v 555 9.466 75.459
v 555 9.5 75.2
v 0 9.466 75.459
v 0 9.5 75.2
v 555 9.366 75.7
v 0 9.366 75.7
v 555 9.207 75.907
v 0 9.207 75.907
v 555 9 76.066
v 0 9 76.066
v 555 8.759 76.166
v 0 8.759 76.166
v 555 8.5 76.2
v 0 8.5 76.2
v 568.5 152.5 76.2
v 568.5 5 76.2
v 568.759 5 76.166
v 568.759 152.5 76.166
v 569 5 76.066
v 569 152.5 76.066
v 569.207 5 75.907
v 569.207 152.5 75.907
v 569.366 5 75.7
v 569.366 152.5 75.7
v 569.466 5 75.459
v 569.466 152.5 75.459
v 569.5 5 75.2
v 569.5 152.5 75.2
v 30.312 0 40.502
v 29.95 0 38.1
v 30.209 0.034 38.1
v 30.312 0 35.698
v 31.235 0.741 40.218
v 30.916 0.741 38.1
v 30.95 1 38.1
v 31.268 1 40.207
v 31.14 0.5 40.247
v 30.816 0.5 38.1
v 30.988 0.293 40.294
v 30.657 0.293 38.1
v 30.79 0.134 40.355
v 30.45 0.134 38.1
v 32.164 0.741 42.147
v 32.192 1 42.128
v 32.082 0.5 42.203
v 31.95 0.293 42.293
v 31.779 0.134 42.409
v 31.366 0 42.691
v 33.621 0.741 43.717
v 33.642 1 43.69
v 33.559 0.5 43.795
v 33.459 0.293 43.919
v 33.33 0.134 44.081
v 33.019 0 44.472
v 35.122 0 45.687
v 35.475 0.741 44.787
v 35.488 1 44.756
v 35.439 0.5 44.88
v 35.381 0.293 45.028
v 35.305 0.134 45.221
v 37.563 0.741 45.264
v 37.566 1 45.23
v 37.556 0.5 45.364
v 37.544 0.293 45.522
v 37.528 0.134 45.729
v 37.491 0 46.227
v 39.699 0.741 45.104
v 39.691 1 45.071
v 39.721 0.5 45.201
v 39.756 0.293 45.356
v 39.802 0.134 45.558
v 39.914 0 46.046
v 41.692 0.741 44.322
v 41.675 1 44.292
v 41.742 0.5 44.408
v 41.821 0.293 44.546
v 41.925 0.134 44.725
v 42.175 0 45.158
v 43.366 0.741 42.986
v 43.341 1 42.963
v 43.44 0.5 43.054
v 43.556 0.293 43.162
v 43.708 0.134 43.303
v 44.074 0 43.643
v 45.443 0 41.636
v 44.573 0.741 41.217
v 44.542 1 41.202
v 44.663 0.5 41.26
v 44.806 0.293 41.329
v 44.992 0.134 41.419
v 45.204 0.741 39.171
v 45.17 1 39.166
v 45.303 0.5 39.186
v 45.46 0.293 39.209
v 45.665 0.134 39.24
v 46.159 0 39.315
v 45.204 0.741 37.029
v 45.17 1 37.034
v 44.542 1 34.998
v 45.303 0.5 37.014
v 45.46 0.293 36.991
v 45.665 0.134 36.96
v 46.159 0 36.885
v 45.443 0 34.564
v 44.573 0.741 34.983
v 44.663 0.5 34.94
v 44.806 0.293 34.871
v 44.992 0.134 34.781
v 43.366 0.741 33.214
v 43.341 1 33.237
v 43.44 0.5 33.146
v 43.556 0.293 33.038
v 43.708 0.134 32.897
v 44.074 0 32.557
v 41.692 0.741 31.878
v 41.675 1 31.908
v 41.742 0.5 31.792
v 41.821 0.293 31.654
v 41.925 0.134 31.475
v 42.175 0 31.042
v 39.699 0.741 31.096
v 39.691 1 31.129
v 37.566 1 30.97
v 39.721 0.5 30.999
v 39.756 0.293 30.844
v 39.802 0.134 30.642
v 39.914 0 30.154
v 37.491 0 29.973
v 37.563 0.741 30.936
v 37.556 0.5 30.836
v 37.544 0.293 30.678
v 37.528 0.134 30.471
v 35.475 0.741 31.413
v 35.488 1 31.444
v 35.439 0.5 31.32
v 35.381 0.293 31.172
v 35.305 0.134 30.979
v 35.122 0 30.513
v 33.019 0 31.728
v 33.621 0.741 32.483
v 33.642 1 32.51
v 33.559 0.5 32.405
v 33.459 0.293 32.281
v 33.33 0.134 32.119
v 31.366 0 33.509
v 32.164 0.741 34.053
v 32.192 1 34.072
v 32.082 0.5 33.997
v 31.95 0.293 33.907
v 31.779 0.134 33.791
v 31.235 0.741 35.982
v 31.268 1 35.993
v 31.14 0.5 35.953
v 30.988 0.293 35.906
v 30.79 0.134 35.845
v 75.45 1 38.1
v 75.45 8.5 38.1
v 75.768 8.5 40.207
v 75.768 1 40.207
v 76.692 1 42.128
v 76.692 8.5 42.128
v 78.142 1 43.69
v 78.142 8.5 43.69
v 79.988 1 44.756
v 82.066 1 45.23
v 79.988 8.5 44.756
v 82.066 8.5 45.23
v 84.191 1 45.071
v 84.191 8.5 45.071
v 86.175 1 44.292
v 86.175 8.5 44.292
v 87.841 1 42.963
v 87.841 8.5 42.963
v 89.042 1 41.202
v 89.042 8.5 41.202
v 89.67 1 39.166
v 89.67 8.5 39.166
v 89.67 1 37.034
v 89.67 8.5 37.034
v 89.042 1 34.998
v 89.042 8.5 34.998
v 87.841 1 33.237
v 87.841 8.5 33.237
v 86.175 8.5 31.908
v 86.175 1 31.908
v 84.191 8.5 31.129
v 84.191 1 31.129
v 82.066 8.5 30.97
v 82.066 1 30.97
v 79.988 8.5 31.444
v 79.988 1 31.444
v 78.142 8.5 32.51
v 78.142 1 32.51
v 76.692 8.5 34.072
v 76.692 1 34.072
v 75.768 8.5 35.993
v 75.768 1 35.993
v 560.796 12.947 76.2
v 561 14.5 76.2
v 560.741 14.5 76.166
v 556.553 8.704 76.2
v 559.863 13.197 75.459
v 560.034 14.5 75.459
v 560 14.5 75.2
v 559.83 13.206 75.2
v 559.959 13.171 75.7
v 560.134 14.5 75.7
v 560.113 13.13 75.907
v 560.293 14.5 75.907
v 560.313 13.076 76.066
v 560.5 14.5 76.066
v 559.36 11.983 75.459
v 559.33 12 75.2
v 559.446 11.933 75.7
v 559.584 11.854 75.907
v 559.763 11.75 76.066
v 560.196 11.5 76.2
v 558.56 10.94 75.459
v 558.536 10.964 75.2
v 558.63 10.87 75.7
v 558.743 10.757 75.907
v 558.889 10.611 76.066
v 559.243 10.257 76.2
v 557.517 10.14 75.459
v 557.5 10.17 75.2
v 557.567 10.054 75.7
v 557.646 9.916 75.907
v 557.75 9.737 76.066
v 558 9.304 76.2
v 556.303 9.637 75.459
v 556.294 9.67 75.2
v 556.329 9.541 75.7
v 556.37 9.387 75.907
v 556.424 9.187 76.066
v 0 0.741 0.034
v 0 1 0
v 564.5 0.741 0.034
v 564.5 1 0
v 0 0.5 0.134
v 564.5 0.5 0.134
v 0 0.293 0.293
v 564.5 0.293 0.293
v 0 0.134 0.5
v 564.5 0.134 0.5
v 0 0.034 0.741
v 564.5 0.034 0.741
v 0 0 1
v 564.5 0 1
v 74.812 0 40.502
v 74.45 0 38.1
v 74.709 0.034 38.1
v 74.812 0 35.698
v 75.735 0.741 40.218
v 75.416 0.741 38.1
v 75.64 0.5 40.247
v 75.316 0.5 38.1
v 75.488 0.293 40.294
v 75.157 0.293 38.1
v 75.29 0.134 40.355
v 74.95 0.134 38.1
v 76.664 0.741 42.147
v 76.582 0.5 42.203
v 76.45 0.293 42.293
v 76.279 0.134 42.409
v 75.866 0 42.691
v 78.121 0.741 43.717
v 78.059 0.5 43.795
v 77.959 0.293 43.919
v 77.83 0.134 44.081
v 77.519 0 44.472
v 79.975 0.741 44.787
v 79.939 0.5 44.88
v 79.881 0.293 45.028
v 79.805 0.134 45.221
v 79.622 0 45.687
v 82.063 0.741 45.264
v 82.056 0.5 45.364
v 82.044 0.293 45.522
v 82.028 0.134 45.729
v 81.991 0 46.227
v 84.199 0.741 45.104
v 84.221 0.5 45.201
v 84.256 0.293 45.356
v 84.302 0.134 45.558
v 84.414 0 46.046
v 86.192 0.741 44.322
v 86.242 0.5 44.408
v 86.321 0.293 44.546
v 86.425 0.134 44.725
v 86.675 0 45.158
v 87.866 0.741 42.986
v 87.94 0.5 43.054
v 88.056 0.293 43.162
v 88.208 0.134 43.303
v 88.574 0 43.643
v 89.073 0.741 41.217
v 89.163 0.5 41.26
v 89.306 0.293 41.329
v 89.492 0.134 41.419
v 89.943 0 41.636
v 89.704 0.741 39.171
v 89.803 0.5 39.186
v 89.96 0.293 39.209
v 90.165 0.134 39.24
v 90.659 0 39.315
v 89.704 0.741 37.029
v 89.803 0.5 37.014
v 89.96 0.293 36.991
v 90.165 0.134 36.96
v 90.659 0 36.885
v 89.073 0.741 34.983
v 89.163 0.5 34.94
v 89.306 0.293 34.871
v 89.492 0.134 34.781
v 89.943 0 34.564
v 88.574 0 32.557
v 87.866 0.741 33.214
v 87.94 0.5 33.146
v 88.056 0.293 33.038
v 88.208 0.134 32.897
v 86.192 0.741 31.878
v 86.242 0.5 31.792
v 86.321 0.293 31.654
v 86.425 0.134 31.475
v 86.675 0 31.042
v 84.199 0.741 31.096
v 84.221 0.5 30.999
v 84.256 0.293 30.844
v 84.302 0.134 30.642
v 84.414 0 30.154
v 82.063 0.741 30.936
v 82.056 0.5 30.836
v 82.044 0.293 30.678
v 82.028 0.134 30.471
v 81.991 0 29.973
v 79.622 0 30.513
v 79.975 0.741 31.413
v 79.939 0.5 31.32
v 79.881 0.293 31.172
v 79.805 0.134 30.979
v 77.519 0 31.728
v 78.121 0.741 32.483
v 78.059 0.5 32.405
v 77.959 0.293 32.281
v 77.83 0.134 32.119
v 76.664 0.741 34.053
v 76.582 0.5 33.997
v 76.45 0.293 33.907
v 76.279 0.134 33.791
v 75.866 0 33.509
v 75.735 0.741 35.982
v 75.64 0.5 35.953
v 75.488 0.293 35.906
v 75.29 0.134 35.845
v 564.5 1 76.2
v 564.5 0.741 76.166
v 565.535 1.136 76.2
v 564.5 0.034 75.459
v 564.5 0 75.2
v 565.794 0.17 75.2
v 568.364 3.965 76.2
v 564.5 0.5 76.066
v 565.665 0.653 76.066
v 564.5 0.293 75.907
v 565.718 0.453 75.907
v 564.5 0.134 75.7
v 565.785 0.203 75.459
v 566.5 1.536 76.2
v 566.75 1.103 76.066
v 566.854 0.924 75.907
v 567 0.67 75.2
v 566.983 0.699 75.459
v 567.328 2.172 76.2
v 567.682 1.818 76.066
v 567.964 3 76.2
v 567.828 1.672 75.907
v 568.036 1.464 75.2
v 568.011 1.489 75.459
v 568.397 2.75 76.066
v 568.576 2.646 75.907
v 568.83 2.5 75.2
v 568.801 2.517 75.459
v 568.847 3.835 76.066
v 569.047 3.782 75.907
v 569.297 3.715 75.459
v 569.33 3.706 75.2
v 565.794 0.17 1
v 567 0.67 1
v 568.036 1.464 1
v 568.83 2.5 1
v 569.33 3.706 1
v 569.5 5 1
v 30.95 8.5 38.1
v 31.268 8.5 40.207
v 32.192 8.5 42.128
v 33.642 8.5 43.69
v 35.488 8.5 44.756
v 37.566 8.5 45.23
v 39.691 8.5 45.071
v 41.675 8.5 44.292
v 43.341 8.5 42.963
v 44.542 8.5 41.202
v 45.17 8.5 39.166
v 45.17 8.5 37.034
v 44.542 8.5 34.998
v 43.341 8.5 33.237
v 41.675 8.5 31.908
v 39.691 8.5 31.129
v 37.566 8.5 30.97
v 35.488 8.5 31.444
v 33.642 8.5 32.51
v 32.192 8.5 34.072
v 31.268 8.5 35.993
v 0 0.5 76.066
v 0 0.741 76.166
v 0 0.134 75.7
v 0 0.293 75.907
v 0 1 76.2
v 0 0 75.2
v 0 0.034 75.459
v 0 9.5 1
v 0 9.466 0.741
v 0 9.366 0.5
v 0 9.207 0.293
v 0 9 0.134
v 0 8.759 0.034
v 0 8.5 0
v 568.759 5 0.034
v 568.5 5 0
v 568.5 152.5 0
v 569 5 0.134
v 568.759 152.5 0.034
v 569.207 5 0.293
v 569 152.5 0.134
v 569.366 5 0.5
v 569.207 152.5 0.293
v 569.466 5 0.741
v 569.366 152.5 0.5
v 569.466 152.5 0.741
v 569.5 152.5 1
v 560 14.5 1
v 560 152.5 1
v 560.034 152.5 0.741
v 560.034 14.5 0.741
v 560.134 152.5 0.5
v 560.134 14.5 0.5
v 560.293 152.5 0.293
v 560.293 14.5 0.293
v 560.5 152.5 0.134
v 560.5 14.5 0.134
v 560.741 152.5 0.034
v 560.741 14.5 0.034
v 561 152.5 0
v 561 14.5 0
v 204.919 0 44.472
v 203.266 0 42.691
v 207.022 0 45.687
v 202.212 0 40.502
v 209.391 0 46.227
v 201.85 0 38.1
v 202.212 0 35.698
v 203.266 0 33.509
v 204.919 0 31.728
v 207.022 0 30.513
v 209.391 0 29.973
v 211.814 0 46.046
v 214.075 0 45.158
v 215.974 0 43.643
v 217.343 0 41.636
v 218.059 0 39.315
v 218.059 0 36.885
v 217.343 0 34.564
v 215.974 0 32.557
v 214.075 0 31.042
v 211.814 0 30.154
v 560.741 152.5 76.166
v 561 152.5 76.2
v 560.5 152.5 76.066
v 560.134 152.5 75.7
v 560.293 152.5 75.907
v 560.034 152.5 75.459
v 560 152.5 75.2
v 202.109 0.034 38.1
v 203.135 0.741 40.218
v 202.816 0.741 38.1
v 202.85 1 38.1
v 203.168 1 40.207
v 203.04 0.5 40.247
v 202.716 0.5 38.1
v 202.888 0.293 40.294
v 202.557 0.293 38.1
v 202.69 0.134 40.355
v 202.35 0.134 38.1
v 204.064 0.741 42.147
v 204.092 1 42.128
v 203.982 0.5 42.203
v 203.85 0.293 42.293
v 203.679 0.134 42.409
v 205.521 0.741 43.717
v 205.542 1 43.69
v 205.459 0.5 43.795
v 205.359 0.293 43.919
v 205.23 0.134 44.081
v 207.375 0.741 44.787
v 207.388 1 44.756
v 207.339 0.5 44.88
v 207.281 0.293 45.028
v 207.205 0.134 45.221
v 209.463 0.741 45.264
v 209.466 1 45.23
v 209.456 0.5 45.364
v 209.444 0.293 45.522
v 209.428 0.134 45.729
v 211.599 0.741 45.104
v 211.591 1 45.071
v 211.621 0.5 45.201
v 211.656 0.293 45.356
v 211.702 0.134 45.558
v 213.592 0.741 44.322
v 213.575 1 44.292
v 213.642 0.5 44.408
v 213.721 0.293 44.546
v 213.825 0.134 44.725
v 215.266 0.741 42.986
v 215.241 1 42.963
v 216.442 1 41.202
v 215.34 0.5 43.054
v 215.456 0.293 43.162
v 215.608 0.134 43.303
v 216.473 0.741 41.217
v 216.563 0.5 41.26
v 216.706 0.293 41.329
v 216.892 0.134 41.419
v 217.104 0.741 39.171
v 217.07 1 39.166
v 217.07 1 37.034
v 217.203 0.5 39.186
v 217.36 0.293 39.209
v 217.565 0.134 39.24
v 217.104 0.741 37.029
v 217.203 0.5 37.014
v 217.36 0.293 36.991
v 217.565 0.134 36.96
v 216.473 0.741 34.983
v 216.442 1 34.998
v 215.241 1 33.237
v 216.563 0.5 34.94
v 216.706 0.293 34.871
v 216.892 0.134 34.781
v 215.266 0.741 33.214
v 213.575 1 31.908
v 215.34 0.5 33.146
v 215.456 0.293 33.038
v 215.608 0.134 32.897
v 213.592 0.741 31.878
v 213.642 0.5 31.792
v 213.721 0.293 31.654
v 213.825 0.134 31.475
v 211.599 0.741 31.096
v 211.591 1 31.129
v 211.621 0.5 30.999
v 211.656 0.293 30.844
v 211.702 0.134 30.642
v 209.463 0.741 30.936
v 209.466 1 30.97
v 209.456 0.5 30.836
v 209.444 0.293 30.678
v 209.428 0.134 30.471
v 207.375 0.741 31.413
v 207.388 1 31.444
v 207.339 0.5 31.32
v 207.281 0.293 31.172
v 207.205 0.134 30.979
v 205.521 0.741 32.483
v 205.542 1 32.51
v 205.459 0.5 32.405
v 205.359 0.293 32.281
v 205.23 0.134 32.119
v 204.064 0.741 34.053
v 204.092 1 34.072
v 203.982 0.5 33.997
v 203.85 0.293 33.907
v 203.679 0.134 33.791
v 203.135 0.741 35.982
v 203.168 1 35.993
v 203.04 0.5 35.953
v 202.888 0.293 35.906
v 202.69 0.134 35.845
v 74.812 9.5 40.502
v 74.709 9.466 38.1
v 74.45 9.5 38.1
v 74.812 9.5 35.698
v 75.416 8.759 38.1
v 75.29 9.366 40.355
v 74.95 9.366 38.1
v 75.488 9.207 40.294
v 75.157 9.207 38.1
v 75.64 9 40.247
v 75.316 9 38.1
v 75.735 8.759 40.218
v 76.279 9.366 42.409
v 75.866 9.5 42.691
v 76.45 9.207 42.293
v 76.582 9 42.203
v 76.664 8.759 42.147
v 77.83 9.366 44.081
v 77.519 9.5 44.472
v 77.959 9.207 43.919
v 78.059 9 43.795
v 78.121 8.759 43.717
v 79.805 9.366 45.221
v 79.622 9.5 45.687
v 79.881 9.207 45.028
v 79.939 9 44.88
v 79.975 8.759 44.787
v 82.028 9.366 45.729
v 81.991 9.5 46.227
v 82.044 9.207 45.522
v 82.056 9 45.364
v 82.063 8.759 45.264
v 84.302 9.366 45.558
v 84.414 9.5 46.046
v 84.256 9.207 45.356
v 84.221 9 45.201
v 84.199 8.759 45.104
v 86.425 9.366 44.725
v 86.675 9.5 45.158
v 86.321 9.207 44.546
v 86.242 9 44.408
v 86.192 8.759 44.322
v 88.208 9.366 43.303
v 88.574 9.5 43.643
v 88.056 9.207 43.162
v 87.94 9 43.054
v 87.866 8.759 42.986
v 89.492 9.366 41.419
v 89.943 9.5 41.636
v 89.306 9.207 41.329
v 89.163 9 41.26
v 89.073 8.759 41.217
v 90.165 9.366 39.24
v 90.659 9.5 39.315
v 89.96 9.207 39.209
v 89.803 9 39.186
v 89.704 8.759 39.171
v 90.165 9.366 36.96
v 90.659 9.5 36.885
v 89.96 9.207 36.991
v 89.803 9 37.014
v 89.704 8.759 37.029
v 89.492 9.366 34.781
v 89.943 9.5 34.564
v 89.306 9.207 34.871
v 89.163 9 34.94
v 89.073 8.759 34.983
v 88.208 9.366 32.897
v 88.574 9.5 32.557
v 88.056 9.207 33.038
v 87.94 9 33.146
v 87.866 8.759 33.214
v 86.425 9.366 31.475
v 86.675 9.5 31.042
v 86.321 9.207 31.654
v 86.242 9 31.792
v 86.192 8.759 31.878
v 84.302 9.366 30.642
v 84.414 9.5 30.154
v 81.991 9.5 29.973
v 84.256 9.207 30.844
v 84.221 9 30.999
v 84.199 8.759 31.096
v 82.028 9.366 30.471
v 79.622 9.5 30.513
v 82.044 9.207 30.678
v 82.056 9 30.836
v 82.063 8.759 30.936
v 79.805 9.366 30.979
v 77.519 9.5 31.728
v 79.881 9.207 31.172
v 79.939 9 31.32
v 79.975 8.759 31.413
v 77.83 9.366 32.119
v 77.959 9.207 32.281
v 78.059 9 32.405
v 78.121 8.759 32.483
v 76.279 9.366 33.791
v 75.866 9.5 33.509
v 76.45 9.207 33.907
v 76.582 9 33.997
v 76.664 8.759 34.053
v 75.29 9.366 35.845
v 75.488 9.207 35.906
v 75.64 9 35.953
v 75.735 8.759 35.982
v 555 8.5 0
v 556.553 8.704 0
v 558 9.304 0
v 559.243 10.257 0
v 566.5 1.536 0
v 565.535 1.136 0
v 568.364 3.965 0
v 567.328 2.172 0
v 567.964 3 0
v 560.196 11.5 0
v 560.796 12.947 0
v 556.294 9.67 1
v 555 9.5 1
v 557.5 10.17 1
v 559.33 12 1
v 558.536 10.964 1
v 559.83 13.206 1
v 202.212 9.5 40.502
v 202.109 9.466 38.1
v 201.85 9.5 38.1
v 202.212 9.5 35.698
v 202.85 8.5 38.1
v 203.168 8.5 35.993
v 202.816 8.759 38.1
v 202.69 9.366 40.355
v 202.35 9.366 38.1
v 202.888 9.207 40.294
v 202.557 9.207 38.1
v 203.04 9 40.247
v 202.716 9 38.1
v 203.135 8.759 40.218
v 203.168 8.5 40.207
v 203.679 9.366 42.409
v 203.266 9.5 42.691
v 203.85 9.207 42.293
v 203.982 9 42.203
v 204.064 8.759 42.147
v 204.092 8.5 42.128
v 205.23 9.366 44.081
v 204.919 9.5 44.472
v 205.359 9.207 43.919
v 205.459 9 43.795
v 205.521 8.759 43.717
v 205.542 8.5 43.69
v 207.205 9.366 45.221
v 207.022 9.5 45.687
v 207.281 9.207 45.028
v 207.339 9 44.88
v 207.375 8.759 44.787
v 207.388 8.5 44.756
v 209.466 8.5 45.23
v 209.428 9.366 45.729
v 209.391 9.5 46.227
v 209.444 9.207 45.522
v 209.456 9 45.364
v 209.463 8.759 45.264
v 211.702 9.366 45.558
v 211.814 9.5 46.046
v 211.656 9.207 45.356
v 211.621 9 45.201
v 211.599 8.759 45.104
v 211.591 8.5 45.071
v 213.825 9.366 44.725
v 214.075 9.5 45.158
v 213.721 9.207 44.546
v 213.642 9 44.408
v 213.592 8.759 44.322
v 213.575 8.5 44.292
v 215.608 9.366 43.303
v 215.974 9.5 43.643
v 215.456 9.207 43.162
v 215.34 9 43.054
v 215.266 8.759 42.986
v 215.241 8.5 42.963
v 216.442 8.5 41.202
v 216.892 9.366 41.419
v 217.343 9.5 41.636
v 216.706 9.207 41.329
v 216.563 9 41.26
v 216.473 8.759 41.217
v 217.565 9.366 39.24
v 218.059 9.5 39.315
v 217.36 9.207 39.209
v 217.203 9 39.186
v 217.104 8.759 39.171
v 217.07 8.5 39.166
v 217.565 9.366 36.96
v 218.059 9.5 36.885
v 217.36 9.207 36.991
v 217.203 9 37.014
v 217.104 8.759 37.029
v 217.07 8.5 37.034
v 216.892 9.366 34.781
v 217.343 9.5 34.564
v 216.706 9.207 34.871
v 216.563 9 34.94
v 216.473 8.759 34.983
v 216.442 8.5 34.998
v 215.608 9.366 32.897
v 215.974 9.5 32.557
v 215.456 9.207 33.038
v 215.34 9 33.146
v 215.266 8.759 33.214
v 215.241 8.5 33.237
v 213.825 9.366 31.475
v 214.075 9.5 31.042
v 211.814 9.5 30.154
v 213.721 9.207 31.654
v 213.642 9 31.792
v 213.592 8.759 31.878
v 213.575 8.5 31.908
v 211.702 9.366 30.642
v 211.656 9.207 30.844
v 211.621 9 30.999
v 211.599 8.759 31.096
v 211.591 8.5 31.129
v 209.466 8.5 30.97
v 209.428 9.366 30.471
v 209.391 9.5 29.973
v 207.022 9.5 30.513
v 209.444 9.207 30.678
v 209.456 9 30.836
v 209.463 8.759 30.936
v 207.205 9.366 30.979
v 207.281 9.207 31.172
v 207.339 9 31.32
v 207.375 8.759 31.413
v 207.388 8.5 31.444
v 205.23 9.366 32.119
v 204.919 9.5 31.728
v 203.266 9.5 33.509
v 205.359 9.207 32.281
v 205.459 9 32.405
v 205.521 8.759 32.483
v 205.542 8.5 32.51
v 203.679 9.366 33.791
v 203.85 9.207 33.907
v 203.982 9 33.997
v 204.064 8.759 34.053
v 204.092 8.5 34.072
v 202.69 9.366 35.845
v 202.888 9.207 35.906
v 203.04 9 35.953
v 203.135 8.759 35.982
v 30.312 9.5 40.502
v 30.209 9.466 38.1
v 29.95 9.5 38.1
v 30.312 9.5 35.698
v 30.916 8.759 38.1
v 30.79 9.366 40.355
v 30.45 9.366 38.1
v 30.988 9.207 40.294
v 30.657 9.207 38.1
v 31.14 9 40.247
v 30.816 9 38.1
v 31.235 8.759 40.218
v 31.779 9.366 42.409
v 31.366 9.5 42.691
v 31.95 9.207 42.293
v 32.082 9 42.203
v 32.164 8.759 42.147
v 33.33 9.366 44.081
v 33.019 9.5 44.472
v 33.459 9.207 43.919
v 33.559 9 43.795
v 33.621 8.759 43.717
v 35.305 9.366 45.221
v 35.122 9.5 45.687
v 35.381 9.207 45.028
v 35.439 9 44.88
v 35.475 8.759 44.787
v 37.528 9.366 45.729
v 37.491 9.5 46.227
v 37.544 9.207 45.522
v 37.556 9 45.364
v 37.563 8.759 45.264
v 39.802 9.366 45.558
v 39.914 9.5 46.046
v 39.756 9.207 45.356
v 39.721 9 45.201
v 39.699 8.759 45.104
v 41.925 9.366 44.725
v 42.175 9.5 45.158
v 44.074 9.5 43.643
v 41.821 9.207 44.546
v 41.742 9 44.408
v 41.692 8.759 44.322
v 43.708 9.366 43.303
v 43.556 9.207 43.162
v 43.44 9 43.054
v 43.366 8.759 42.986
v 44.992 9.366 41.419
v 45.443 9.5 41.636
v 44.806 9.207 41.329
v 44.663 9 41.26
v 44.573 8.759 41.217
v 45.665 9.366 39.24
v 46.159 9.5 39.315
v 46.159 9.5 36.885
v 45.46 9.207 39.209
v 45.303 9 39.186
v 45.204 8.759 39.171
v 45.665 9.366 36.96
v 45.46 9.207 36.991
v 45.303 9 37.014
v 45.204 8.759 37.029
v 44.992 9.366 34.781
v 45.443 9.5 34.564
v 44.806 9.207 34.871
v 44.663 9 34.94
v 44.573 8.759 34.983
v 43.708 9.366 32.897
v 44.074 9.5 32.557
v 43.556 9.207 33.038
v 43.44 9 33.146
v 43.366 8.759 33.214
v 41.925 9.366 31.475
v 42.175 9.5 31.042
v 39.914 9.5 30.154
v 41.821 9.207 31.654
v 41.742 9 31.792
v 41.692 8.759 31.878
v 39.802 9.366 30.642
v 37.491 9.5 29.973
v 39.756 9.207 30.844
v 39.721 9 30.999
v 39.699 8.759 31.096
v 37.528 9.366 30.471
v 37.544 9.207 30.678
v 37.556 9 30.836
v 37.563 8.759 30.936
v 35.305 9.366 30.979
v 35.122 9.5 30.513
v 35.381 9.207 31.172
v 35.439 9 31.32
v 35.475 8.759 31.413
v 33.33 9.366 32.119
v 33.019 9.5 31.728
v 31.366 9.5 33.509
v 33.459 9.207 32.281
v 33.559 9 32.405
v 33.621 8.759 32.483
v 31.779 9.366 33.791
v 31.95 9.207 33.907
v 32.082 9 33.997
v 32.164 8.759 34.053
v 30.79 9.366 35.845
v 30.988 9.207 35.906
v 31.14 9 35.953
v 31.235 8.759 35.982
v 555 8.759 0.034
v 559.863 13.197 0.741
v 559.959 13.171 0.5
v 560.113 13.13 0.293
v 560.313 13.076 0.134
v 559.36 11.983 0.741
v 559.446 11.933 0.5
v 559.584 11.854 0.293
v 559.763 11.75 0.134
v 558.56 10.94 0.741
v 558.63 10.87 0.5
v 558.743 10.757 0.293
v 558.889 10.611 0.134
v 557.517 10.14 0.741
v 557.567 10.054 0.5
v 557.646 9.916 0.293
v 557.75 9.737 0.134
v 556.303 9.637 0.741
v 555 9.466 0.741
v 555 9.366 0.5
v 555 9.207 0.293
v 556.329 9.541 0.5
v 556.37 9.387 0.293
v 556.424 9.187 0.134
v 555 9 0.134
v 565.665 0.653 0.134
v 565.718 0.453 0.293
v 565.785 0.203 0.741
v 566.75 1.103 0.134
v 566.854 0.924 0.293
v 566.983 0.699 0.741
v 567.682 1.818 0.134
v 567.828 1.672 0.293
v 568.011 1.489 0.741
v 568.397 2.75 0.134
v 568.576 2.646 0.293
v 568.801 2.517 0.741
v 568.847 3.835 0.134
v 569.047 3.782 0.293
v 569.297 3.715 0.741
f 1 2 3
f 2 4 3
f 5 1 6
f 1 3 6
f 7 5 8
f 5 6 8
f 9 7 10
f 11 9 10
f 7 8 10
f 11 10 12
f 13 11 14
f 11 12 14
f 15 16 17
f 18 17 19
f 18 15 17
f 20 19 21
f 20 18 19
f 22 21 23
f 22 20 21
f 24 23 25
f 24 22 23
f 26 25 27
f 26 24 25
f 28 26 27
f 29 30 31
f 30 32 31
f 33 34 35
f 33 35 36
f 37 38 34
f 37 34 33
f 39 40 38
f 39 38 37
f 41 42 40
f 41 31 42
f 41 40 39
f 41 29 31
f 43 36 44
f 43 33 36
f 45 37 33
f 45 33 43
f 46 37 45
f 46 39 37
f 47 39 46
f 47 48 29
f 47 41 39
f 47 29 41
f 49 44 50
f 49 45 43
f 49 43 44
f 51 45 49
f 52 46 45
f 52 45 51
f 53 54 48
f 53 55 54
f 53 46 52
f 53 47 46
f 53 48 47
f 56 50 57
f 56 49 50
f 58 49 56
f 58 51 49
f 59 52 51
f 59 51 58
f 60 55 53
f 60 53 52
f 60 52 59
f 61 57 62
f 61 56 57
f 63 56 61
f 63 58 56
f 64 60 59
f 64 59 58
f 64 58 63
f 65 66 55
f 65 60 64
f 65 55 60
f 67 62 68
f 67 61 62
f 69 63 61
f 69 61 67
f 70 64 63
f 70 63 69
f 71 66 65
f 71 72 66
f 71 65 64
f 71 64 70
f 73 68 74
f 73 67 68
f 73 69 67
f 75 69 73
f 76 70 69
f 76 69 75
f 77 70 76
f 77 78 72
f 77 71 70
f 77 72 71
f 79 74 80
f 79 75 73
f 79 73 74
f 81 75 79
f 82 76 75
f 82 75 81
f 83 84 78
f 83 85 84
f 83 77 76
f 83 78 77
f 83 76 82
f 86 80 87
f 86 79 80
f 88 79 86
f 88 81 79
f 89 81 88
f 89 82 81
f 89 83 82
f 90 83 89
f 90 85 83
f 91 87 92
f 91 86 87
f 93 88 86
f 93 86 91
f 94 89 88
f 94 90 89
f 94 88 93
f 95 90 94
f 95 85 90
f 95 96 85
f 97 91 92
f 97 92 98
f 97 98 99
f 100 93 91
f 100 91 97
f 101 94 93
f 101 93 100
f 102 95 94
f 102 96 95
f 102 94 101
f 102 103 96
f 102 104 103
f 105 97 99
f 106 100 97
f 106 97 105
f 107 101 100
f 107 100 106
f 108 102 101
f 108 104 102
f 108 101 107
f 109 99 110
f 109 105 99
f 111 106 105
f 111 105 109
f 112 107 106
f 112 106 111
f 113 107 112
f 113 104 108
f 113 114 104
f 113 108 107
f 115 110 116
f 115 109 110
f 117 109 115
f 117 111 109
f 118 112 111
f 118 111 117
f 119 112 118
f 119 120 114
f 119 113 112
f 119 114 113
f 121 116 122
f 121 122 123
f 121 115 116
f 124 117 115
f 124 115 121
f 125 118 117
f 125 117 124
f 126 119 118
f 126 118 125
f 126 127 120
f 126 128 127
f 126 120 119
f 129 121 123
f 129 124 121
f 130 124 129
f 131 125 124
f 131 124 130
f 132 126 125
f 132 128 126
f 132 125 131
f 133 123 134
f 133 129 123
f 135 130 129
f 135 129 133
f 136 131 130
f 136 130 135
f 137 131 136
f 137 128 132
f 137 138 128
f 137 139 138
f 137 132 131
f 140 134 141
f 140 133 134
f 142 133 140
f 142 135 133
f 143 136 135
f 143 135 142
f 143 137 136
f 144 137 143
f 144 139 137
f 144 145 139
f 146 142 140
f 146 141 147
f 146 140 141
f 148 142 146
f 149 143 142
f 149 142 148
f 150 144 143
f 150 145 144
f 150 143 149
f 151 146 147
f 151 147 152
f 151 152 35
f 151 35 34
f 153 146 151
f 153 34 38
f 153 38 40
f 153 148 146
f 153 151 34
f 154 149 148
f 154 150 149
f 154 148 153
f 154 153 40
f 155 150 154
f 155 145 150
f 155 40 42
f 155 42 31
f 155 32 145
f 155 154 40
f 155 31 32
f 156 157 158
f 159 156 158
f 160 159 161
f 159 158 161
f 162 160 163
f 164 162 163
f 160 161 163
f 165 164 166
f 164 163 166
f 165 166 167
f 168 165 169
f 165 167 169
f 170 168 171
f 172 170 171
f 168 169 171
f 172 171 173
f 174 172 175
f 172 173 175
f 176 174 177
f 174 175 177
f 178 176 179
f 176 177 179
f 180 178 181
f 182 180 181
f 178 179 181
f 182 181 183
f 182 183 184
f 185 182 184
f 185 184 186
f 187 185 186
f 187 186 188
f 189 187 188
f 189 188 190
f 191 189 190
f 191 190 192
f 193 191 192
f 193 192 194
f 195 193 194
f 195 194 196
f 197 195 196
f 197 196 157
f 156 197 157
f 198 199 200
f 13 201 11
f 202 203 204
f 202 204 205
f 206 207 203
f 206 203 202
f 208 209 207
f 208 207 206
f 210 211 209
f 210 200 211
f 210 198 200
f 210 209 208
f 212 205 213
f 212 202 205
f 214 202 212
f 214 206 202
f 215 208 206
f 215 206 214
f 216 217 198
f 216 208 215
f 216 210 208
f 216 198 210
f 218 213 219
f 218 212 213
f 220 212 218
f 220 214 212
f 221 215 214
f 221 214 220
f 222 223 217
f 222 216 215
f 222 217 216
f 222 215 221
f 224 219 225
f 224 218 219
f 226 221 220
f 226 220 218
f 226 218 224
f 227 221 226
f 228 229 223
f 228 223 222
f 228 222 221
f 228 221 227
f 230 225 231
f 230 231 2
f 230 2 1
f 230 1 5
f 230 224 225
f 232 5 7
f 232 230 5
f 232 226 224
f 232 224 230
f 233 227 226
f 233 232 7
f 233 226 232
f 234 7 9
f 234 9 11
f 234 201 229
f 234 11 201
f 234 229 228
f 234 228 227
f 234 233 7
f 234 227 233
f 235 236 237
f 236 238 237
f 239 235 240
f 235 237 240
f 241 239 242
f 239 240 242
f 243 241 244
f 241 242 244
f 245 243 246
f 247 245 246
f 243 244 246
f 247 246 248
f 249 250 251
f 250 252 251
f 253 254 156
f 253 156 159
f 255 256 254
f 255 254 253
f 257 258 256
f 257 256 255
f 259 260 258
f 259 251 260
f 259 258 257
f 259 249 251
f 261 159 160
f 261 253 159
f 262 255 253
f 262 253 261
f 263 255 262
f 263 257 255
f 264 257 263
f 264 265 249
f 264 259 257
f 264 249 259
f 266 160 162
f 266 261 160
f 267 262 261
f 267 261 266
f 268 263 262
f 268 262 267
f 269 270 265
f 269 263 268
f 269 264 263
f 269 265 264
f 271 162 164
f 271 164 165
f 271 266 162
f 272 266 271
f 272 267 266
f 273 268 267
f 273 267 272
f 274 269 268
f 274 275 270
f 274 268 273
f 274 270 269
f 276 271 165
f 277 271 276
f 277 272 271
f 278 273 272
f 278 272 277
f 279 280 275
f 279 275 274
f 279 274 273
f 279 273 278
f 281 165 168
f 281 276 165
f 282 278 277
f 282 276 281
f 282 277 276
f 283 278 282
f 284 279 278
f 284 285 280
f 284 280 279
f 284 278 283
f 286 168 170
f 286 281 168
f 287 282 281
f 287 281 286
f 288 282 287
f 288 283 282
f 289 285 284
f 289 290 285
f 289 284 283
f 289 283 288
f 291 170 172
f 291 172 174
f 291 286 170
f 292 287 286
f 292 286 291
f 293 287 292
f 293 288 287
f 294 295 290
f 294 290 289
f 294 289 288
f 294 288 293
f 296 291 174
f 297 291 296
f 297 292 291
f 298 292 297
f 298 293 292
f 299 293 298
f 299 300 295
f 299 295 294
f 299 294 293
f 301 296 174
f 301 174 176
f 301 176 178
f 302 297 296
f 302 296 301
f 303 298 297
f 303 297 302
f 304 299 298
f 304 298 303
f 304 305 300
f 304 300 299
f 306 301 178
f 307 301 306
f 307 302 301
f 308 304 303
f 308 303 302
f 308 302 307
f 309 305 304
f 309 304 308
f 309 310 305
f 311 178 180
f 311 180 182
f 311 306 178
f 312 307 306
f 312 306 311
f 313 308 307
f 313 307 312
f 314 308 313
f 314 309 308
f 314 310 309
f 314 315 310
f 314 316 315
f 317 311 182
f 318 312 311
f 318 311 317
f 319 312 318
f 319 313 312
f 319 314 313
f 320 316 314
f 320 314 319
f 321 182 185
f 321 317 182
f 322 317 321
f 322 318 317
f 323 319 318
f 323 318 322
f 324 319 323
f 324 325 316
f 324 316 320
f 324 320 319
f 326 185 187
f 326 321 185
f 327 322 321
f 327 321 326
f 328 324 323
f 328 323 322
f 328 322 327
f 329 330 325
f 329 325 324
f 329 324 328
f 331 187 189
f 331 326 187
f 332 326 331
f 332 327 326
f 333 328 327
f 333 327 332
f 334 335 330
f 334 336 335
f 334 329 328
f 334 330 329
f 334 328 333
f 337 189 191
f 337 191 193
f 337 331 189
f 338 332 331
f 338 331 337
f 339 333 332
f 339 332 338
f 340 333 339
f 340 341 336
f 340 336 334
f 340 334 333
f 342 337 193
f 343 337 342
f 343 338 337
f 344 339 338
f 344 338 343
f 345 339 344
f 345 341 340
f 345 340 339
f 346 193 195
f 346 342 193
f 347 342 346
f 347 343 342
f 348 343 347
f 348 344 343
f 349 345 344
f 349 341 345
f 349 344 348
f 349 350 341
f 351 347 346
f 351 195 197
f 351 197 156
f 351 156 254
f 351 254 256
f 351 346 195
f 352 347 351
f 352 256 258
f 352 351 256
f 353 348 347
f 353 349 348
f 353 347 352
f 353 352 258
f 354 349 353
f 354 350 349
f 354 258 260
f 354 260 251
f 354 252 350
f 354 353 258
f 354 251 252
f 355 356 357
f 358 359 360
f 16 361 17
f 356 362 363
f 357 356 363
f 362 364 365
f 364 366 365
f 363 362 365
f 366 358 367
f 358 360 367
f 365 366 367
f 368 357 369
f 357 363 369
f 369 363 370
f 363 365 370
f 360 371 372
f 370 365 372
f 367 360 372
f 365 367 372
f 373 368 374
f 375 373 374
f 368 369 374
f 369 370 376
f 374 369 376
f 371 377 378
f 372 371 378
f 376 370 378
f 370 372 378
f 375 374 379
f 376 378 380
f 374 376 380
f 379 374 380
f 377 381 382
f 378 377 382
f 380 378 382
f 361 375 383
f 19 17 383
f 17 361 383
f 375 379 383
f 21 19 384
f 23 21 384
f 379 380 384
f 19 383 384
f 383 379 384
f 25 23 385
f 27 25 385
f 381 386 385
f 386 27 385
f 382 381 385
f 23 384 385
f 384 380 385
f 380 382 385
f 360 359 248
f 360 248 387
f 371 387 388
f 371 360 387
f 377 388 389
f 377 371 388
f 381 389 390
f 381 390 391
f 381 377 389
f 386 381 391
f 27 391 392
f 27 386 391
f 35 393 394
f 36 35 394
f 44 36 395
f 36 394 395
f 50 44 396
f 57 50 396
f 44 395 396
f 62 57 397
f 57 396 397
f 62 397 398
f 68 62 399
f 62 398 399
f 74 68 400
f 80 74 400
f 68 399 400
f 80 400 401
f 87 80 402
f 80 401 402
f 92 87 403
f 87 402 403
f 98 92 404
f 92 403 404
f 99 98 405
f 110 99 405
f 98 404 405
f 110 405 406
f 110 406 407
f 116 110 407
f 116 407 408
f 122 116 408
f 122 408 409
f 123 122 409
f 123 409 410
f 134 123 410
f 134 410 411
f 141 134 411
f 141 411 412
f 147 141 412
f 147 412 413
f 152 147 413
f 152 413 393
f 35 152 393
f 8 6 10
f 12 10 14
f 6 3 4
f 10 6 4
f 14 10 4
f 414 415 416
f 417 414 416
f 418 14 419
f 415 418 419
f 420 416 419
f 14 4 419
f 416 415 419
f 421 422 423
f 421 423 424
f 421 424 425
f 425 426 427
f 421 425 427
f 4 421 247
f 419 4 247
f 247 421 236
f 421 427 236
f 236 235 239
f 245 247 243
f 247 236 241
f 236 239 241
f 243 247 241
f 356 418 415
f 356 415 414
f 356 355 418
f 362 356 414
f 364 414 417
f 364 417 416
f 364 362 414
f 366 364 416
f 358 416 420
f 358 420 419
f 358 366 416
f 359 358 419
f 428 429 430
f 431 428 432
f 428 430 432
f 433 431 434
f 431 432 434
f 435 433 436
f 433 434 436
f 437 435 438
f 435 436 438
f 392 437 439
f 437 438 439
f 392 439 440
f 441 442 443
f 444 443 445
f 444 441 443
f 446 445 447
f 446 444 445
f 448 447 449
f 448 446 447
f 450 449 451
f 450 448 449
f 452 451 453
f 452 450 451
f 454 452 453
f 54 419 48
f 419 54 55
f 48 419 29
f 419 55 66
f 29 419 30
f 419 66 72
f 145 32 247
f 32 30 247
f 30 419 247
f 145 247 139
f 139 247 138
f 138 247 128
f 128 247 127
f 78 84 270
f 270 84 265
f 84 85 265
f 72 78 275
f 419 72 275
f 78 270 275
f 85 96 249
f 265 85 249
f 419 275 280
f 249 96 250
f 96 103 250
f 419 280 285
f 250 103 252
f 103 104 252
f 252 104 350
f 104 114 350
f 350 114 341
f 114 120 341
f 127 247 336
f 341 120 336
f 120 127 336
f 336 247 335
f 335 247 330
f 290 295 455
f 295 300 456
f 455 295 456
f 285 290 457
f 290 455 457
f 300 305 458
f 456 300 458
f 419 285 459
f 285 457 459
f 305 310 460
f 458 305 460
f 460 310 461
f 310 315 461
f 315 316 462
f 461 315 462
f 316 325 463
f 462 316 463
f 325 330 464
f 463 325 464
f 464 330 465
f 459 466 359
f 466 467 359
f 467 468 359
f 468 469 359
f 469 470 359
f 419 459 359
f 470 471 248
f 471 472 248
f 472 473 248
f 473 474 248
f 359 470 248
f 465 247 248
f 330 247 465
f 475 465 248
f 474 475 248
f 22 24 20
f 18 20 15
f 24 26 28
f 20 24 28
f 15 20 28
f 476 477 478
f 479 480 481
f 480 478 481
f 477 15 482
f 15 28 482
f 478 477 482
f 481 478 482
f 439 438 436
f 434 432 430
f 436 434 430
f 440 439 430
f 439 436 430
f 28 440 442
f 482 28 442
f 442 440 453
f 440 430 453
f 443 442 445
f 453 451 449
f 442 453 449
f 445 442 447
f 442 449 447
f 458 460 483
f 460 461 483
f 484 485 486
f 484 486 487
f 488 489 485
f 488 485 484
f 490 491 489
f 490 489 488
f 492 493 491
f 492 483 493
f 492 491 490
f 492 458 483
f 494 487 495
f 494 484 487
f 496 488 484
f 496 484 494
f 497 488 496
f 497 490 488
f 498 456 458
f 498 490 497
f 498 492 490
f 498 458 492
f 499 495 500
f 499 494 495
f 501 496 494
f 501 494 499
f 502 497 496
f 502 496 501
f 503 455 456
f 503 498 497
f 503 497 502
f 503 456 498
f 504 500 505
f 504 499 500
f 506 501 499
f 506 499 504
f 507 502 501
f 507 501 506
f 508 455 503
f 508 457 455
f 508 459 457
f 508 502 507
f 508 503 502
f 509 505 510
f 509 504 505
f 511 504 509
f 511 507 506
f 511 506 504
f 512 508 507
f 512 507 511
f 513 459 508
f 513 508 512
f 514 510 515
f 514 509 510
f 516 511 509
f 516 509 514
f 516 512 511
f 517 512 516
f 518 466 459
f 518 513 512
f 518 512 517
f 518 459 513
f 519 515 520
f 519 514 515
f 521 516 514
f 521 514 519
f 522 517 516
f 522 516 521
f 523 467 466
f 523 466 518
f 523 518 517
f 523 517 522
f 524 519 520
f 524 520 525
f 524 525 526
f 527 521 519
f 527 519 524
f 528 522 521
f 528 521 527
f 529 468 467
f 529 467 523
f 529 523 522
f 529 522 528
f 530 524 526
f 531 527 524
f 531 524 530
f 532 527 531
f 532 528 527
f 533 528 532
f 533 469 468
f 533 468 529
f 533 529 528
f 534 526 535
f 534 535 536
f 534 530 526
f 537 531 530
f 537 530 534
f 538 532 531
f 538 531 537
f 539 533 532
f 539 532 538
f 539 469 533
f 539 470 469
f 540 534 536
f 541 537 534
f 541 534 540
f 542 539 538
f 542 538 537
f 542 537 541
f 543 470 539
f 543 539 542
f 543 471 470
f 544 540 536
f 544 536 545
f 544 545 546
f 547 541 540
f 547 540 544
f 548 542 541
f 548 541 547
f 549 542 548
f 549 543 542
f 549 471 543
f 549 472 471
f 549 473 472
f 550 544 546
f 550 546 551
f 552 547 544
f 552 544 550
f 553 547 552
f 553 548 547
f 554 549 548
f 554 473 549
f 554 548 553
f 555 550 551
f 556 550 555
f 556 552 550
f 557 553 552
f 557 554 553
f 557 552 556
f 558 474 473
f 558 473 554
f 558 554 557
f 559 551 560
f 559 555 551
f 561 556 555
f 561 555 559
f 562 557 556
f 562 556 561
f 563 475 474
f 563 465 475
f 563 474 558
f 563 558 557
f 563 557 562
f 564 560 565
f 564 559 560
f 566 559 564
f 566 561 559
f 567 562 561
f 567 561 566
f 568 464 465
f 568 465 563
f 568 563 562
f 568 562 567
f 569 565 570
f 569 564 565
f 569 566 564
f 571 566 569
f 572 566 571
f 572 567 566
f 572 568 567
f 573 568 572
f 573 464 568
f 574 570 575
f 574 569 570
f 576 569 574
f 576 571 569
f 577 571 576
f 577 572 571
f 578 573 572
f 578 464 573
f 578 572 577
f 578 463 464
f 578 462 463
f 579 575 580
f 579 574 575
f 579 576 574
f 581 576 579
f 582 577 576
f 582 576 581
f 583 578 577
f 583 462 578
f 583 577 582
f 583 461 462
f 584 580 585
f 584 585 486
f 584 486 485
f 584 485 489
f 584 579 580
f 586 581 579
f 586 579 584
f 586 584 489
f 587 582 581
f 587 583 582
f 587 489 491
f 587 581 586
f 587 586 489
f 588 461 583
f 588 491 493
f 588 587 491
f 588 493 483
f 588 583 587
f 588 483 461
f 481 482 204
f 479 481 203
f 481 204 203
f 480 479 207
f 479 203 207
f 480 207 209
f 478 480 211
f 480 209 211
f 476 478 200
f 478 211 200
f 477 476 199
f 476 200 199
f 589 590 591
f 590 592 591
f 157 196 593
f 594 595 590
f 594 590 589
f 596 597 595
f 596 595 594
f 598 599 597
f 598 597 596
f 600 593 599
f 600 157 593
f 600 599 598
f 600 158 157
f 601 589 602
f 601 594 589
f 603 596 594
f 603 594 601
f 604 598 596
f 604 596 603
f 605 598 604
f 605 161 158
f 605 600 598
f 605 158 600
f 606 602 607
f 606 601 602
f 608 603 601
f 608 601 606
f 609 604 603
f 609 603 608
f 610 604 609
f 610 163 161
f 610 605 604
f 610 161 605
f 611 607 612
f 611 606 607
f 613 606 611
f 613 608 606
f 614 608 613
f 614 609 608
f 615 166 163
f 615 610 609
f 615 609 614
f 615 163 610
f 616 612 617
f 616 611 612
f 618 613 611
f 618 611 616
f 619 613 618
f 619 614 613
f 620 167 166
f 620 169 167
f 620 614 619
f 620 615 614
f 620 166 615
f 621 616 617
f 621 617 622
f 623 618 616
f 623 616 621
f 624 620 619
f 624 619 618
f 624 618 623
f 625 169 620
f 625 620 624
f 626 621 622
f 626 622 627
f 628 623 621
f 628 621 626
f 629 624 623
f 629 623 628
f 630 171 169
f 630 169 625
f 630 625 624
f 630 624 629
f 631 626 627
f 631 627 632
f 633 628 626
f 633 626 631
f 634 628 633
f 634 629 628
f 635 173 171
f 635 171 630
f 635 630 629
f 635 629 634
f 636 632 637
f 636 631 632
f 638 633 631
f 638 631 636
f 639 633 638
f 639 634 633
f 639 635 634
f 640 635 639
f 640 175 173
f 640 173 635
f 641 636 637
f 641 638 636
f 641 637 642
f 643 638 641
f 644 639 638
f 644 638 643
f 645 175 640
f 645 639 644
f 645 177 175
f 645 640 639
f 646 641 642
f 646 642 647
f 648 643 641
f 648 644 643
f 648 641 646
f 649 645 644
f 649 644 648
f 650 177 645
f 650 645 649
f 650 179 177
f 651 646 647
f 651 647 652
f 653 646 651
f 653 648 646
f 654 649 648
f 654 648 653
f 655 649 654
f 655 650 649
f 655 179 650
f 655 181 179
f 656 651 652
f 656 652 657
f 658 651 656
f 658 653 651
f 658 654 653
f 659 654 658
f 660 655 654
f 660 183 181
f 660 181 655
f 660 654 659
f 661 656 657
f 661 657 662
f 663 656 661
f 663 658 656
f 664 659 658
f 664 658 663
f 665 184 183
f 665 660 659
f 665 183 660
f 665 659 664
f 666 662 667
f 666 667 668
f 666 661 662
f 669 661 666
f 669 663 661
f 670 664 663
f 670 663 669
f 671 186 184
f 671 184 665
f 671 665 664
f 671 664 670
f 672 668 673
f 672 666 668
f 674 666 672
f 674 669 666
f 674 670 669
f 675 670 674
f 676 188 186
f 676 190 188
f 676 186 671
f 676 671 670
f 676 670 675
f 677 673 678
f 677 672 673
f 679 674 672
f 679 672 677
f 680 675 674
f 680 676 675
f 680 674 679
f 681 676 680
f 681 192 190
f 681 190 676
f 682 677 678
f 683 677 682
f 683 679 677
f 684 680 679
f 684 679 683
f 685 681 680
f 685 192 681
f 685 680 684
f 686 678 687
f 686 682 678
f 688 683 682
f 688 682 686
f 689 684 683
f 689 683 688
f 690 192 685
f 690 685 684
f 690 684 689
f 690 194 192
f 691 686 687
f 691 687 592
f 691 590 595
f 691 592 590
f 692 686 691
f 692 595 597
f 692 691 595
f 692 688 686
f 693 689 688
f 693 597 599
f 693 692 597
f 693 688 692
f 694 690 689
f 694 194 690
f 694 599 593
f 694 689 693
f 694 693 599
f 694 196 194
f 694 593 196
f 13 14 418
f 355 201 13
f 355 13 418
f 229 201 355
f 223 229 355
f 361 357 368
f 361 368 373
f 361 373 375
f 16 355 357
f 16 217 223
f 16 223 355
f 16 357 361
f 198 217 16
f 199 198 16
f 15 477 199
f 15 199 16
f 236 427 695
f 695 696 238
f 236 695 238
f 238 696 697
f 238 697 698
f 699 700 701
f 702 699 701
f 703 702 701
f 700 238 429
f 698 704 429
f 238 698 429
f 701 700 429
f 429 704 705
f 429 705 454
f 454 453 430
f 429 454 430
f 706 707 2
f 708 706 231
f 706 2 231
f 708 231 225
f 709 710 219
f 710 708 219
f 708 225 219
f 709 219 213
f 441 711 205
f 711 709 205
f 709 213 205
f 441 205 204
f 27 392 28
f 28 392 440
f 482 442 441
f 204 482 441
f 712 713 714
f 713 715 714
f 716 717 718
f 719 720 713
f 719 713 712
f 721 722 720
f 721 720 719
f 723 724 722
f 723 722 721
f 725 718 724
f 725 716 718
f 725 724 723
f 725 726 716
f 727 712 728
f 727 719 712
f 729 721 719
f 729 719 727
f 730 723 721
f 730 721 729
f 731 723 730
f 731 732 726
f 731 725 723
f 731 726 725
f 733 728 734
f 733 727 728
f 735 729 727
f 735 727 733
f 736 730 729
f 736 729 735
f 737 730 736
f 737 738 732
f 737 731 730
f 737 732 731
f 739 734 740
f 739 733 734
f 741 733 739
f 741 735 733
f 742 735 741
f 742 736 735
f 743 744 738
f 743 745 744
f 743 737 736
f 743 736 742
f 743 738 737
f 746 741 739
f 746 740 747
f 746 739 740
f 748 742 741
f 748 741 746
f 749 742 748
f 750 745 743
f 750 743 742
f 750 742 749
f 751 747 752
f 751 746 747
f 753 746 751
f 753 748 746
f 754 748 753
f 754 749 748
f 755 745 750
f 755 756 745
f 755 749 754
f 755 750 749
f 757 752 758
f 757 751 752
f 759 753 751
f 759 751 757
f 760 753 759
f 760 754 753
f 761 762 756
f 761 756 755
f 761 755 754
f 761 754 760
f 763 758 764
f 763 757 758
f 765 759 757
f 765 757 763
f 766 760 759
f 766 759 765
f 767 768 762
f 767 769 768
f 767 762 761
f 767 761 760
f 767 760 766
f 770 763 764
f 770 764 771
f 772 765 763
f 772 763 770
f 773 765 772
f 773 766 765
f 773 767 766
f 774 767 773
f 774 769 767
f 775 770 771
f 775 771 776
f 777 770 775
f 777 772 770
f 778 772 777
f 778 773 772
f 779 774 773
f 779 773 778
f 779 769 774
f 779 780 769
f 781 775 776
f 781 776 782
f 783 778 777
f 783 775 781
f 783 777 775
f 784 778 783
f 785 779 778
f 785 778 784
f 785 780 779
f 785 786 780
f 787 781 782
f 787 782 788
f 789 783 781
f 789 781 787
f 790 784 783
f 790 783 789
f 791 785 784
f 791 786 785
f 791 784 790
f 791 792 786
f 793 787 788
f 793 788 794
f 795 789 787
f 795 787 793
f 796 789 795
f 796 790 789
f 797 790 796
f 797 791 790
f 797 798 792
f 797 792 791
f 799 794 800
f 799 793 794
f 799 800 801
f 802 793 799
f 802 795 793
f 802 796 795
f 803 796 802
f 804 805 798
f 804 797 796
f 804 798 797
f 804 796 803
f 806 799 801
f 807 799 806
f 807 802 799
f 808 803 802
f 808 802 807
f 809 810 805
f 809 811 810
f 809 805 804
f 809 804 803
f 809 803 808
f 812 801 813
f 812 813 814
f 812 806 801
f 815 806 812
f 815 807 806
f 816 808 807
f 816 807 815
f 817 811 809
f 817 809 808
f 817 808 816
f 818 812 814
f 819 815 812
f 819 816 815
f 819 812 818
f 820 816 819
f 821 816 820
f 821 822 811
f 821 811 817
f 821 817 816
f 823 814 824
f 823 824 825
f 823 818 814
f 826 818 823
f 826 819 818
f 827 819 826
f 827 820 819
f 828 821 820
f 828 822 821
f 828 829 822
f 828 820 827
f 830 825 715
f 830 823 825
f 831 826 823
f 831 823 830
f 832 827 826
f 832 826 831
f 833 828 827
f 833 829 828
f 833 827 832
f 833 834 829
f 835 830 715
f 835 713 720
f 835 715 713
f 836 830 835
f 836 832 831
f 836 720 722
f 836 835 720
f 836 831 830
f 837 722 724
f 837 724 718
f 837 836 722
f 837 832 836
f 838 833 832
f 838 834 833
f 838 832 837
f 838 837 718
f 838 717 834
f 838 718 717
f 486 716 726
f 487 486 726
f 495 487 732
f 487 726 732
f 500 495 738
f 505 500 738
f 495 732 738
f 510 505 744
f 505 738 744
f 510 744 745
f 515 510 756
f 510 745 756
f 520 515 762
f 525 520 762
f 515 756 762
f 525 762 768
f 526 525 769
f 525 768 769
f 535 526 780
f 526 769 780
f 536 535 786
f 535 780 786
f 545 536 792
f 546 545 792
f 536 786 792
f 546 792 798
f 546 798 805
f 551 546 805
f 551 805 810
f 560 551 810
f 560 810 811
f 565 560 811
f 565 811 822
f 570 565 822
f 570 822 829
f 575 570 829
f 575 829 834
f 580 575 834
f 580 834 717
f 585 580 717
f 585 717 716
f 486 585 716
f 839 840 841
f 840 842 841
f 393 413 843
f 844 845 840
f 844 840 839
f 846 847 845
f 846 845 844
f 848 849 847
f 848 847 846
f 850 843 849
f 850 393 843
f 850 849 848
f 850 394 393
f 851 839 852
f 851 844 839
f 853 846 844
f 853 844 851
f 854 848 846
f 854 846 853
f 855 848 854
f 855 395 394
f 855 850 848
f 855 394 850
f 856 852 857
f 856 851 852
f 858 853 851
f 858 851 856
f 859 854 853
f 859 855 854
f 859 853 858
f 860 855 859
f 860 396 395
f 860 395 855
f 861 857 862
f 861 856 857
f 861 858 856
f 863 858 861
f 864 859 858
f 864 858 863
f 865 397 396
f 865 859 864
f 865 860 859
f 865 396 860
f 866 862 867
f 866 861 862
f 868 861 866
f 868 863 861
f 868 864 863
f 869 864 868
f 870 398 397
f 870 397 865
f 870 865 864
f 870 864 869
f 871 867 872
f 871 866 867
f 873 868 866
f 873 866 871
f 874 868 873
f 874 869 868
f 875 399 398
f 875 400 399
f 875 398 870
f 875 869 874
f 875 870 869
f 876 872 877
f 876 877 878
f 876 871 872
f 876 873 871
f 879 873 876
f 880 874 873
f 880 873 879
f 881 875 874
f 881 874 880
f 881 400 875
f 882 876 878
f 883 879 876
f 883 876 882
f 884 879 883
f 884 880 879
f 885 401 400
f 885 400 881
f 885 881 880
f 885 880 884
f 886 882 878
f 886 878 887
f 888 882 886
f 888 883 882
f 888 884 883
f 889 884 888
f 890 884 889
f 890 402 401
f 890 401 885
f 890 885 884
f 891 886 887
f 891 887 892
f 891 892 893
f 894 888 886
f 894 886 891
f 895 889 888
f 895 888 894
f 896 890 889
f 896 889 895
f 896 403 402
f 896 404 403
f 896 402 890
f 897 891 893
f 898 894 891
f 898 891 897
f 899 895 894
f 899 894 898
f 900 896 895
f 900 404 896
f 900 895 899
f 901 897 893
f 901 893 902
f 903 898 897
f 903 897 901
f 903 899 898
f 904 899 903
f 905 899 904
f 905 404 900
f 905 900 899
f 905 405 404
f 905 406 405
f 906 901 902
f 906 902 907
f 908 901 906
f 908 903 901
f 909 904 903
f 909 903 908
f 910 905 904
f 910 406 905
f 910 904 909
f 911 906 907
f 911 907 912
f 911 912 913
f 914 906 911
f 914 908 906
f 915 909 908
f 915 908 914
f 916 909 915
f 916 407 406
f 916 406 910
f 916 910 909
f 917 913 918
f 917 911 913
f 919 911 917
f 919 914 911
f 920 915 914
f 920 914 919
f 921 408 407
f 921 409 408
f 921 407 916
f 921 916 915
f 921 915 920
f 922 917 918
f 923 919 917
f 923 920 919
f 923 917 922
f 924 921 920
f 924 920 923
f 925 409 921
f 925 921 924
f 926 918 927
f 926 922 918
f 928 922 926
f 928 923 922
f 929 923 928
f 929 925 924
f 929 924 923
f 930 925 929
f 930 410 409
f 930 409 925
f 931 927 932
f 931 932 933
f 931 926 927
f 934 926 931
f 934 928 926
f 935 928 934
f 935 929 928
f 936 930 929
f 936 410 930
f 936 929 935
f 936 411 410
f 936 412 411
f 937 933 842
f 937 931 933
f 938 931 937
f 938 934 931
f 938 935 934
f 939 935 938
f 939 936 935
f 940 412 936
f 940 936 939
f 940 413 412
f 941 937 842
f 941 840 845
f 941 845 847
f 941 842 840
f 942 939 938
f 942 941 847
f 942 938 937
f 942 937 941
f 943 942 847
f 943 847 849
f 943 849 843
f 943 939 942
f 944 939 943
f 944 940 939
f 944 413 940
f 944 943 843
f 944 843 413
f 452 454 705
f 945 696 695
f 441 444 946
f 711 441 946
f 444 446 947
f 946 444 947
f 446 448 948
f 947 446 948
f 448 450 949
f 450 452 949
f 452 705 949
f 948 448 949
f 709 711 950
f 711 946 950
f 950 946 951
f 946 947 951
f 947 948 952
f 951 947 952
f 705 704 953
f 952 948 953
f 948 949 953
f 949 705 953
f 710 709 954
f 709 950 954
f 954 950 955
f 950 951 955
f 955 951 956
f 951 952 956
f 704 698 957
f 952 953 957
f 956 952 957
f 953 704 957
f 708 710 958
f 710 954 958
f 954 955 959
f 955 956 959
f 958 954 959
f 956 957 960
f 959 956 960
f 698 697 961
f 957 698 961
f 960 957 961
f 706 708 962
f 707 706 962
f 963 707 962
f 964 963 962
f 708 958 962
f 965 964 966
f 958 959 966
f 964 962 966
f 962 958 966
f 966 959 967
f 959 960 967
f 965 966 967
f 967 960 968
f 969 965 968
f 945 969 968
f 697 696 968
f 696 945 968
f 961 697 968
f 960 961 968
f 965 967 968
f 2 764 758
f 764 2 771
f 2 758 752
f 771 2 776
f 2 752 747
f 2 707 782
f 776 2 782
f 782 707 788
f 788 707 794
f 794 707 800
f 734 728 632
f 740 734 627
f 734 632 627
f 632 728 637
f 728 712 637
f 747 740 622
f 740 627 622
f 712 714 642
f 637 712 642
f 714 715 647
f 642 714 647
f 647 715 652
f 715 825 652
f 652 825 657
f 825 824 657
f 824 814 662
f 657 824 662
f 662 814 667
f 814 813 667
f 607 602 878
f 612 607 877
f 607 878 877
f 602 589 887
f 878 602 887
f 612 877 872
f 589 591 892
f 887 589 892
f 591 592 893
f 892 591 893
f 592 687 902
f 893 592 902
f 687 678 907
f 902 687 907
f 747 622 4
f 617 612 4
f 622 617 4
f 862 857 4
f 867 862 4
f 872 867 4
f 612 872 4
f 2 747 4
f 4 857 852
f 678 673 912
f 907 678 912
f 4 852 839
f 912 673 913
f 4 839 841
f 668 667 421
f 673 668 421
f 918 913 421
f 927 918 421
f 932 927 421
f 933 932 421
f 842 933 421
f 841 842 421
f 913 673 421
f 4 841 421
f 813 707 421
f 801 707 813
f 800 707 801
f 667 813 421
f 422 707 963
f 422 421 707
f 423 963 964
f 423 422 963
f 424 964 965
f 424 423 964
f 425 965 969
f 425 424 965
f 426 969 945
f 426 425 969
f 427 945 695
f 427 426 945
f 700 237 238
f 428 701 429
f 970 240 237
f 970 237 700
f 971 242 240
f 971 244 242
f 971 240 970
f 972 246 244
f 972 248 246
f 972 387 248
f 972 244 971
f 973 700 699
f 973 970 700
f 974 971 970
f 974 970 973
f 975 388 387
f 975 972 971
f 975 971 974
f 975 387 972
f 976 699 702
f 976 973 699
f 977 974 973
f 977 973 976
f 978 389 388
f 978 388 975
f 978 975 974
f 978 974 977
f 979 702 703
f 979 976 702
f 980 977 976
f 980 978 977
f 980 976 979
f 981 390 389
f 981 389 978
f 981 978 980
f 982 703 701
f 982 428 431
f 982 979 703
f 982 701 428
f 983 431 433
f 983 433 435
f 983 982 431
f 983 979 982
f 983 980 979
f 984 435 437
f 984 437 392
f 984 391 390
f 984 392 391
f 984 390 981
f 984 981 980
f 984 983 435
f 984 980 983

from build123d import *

# Parameters (mm, degrees)
F1_DEPTH = 76.2
F2_R     = 7.15
F3_DEPTH = 9.501
F4_R     = 5
F5_R     = 1
F6_R     = 1


with BuildPart() as f1:
    # F0 (on Top) → F1 (new body)
    with BuildSketch(Plane.XY):
        Polygon((0, 9.5), (0, 0), (569.5, 0), (569.5, 152.5), (560, 152.5), (560, 9.5), align=None)
    extrude(amount=F1_DEPTH)

    # F2 (on face) → F3 (cut, through all)
    with BuildSketch(Plane(origin=(0, 9.5, 0), x_dir=(-1, 0, 0), z_dir=(0, 1, 0))):
        with Locations((-38.1, 38.1)):
            Circle(F2_R)
        with Locations((-82.6, 38.1)):
            Circle(F2_R)
        with Locations((-210, 38.1)):
            Circle(F2_R)
    extrude(amount=-F3_DEPTH, mode=Mode.SUBTRACT)

    # F4
    f4_edges = [f1.edges().sort_by_distance(p)[0] for p in [
        (569.5, 0, 38.1),
        (560, 9.5, 38.1),
    ]]
    fillet(f4_edges, radius=F4_R)

    # F5
    f5_edges = [f1.edges().sort_by_distance(p)[0] for p in [
        (277.5, 9.5, 76.2),
        (277.5, 9.5, 0),
        (282.25, 0, 76.2),
        (282.25, 0, 0),
        (560, 83.5, 0),
        (569.5, 78.75, 0),
        (569.5, 78.75, 76.2),
        (560, 83.5, 76.2),
    ]]
    fillet(f5_edges, radius=F5_R)

    # F6
    f6_edges = [f1.edges().sort_by_distance(p)[0] for p in [
        (217.15, 0, 38.1),
        (89.75, 0, 38.1),
        (45.25, 0, 38.1),
        (217.15, 9.5, 38.1),
        (89.75, 9.5, 38.1),
        (45.25, 9.5, 38.1),
    ]]
    fillet(f6_edges, radius=F6_R)


solid = f1.part
